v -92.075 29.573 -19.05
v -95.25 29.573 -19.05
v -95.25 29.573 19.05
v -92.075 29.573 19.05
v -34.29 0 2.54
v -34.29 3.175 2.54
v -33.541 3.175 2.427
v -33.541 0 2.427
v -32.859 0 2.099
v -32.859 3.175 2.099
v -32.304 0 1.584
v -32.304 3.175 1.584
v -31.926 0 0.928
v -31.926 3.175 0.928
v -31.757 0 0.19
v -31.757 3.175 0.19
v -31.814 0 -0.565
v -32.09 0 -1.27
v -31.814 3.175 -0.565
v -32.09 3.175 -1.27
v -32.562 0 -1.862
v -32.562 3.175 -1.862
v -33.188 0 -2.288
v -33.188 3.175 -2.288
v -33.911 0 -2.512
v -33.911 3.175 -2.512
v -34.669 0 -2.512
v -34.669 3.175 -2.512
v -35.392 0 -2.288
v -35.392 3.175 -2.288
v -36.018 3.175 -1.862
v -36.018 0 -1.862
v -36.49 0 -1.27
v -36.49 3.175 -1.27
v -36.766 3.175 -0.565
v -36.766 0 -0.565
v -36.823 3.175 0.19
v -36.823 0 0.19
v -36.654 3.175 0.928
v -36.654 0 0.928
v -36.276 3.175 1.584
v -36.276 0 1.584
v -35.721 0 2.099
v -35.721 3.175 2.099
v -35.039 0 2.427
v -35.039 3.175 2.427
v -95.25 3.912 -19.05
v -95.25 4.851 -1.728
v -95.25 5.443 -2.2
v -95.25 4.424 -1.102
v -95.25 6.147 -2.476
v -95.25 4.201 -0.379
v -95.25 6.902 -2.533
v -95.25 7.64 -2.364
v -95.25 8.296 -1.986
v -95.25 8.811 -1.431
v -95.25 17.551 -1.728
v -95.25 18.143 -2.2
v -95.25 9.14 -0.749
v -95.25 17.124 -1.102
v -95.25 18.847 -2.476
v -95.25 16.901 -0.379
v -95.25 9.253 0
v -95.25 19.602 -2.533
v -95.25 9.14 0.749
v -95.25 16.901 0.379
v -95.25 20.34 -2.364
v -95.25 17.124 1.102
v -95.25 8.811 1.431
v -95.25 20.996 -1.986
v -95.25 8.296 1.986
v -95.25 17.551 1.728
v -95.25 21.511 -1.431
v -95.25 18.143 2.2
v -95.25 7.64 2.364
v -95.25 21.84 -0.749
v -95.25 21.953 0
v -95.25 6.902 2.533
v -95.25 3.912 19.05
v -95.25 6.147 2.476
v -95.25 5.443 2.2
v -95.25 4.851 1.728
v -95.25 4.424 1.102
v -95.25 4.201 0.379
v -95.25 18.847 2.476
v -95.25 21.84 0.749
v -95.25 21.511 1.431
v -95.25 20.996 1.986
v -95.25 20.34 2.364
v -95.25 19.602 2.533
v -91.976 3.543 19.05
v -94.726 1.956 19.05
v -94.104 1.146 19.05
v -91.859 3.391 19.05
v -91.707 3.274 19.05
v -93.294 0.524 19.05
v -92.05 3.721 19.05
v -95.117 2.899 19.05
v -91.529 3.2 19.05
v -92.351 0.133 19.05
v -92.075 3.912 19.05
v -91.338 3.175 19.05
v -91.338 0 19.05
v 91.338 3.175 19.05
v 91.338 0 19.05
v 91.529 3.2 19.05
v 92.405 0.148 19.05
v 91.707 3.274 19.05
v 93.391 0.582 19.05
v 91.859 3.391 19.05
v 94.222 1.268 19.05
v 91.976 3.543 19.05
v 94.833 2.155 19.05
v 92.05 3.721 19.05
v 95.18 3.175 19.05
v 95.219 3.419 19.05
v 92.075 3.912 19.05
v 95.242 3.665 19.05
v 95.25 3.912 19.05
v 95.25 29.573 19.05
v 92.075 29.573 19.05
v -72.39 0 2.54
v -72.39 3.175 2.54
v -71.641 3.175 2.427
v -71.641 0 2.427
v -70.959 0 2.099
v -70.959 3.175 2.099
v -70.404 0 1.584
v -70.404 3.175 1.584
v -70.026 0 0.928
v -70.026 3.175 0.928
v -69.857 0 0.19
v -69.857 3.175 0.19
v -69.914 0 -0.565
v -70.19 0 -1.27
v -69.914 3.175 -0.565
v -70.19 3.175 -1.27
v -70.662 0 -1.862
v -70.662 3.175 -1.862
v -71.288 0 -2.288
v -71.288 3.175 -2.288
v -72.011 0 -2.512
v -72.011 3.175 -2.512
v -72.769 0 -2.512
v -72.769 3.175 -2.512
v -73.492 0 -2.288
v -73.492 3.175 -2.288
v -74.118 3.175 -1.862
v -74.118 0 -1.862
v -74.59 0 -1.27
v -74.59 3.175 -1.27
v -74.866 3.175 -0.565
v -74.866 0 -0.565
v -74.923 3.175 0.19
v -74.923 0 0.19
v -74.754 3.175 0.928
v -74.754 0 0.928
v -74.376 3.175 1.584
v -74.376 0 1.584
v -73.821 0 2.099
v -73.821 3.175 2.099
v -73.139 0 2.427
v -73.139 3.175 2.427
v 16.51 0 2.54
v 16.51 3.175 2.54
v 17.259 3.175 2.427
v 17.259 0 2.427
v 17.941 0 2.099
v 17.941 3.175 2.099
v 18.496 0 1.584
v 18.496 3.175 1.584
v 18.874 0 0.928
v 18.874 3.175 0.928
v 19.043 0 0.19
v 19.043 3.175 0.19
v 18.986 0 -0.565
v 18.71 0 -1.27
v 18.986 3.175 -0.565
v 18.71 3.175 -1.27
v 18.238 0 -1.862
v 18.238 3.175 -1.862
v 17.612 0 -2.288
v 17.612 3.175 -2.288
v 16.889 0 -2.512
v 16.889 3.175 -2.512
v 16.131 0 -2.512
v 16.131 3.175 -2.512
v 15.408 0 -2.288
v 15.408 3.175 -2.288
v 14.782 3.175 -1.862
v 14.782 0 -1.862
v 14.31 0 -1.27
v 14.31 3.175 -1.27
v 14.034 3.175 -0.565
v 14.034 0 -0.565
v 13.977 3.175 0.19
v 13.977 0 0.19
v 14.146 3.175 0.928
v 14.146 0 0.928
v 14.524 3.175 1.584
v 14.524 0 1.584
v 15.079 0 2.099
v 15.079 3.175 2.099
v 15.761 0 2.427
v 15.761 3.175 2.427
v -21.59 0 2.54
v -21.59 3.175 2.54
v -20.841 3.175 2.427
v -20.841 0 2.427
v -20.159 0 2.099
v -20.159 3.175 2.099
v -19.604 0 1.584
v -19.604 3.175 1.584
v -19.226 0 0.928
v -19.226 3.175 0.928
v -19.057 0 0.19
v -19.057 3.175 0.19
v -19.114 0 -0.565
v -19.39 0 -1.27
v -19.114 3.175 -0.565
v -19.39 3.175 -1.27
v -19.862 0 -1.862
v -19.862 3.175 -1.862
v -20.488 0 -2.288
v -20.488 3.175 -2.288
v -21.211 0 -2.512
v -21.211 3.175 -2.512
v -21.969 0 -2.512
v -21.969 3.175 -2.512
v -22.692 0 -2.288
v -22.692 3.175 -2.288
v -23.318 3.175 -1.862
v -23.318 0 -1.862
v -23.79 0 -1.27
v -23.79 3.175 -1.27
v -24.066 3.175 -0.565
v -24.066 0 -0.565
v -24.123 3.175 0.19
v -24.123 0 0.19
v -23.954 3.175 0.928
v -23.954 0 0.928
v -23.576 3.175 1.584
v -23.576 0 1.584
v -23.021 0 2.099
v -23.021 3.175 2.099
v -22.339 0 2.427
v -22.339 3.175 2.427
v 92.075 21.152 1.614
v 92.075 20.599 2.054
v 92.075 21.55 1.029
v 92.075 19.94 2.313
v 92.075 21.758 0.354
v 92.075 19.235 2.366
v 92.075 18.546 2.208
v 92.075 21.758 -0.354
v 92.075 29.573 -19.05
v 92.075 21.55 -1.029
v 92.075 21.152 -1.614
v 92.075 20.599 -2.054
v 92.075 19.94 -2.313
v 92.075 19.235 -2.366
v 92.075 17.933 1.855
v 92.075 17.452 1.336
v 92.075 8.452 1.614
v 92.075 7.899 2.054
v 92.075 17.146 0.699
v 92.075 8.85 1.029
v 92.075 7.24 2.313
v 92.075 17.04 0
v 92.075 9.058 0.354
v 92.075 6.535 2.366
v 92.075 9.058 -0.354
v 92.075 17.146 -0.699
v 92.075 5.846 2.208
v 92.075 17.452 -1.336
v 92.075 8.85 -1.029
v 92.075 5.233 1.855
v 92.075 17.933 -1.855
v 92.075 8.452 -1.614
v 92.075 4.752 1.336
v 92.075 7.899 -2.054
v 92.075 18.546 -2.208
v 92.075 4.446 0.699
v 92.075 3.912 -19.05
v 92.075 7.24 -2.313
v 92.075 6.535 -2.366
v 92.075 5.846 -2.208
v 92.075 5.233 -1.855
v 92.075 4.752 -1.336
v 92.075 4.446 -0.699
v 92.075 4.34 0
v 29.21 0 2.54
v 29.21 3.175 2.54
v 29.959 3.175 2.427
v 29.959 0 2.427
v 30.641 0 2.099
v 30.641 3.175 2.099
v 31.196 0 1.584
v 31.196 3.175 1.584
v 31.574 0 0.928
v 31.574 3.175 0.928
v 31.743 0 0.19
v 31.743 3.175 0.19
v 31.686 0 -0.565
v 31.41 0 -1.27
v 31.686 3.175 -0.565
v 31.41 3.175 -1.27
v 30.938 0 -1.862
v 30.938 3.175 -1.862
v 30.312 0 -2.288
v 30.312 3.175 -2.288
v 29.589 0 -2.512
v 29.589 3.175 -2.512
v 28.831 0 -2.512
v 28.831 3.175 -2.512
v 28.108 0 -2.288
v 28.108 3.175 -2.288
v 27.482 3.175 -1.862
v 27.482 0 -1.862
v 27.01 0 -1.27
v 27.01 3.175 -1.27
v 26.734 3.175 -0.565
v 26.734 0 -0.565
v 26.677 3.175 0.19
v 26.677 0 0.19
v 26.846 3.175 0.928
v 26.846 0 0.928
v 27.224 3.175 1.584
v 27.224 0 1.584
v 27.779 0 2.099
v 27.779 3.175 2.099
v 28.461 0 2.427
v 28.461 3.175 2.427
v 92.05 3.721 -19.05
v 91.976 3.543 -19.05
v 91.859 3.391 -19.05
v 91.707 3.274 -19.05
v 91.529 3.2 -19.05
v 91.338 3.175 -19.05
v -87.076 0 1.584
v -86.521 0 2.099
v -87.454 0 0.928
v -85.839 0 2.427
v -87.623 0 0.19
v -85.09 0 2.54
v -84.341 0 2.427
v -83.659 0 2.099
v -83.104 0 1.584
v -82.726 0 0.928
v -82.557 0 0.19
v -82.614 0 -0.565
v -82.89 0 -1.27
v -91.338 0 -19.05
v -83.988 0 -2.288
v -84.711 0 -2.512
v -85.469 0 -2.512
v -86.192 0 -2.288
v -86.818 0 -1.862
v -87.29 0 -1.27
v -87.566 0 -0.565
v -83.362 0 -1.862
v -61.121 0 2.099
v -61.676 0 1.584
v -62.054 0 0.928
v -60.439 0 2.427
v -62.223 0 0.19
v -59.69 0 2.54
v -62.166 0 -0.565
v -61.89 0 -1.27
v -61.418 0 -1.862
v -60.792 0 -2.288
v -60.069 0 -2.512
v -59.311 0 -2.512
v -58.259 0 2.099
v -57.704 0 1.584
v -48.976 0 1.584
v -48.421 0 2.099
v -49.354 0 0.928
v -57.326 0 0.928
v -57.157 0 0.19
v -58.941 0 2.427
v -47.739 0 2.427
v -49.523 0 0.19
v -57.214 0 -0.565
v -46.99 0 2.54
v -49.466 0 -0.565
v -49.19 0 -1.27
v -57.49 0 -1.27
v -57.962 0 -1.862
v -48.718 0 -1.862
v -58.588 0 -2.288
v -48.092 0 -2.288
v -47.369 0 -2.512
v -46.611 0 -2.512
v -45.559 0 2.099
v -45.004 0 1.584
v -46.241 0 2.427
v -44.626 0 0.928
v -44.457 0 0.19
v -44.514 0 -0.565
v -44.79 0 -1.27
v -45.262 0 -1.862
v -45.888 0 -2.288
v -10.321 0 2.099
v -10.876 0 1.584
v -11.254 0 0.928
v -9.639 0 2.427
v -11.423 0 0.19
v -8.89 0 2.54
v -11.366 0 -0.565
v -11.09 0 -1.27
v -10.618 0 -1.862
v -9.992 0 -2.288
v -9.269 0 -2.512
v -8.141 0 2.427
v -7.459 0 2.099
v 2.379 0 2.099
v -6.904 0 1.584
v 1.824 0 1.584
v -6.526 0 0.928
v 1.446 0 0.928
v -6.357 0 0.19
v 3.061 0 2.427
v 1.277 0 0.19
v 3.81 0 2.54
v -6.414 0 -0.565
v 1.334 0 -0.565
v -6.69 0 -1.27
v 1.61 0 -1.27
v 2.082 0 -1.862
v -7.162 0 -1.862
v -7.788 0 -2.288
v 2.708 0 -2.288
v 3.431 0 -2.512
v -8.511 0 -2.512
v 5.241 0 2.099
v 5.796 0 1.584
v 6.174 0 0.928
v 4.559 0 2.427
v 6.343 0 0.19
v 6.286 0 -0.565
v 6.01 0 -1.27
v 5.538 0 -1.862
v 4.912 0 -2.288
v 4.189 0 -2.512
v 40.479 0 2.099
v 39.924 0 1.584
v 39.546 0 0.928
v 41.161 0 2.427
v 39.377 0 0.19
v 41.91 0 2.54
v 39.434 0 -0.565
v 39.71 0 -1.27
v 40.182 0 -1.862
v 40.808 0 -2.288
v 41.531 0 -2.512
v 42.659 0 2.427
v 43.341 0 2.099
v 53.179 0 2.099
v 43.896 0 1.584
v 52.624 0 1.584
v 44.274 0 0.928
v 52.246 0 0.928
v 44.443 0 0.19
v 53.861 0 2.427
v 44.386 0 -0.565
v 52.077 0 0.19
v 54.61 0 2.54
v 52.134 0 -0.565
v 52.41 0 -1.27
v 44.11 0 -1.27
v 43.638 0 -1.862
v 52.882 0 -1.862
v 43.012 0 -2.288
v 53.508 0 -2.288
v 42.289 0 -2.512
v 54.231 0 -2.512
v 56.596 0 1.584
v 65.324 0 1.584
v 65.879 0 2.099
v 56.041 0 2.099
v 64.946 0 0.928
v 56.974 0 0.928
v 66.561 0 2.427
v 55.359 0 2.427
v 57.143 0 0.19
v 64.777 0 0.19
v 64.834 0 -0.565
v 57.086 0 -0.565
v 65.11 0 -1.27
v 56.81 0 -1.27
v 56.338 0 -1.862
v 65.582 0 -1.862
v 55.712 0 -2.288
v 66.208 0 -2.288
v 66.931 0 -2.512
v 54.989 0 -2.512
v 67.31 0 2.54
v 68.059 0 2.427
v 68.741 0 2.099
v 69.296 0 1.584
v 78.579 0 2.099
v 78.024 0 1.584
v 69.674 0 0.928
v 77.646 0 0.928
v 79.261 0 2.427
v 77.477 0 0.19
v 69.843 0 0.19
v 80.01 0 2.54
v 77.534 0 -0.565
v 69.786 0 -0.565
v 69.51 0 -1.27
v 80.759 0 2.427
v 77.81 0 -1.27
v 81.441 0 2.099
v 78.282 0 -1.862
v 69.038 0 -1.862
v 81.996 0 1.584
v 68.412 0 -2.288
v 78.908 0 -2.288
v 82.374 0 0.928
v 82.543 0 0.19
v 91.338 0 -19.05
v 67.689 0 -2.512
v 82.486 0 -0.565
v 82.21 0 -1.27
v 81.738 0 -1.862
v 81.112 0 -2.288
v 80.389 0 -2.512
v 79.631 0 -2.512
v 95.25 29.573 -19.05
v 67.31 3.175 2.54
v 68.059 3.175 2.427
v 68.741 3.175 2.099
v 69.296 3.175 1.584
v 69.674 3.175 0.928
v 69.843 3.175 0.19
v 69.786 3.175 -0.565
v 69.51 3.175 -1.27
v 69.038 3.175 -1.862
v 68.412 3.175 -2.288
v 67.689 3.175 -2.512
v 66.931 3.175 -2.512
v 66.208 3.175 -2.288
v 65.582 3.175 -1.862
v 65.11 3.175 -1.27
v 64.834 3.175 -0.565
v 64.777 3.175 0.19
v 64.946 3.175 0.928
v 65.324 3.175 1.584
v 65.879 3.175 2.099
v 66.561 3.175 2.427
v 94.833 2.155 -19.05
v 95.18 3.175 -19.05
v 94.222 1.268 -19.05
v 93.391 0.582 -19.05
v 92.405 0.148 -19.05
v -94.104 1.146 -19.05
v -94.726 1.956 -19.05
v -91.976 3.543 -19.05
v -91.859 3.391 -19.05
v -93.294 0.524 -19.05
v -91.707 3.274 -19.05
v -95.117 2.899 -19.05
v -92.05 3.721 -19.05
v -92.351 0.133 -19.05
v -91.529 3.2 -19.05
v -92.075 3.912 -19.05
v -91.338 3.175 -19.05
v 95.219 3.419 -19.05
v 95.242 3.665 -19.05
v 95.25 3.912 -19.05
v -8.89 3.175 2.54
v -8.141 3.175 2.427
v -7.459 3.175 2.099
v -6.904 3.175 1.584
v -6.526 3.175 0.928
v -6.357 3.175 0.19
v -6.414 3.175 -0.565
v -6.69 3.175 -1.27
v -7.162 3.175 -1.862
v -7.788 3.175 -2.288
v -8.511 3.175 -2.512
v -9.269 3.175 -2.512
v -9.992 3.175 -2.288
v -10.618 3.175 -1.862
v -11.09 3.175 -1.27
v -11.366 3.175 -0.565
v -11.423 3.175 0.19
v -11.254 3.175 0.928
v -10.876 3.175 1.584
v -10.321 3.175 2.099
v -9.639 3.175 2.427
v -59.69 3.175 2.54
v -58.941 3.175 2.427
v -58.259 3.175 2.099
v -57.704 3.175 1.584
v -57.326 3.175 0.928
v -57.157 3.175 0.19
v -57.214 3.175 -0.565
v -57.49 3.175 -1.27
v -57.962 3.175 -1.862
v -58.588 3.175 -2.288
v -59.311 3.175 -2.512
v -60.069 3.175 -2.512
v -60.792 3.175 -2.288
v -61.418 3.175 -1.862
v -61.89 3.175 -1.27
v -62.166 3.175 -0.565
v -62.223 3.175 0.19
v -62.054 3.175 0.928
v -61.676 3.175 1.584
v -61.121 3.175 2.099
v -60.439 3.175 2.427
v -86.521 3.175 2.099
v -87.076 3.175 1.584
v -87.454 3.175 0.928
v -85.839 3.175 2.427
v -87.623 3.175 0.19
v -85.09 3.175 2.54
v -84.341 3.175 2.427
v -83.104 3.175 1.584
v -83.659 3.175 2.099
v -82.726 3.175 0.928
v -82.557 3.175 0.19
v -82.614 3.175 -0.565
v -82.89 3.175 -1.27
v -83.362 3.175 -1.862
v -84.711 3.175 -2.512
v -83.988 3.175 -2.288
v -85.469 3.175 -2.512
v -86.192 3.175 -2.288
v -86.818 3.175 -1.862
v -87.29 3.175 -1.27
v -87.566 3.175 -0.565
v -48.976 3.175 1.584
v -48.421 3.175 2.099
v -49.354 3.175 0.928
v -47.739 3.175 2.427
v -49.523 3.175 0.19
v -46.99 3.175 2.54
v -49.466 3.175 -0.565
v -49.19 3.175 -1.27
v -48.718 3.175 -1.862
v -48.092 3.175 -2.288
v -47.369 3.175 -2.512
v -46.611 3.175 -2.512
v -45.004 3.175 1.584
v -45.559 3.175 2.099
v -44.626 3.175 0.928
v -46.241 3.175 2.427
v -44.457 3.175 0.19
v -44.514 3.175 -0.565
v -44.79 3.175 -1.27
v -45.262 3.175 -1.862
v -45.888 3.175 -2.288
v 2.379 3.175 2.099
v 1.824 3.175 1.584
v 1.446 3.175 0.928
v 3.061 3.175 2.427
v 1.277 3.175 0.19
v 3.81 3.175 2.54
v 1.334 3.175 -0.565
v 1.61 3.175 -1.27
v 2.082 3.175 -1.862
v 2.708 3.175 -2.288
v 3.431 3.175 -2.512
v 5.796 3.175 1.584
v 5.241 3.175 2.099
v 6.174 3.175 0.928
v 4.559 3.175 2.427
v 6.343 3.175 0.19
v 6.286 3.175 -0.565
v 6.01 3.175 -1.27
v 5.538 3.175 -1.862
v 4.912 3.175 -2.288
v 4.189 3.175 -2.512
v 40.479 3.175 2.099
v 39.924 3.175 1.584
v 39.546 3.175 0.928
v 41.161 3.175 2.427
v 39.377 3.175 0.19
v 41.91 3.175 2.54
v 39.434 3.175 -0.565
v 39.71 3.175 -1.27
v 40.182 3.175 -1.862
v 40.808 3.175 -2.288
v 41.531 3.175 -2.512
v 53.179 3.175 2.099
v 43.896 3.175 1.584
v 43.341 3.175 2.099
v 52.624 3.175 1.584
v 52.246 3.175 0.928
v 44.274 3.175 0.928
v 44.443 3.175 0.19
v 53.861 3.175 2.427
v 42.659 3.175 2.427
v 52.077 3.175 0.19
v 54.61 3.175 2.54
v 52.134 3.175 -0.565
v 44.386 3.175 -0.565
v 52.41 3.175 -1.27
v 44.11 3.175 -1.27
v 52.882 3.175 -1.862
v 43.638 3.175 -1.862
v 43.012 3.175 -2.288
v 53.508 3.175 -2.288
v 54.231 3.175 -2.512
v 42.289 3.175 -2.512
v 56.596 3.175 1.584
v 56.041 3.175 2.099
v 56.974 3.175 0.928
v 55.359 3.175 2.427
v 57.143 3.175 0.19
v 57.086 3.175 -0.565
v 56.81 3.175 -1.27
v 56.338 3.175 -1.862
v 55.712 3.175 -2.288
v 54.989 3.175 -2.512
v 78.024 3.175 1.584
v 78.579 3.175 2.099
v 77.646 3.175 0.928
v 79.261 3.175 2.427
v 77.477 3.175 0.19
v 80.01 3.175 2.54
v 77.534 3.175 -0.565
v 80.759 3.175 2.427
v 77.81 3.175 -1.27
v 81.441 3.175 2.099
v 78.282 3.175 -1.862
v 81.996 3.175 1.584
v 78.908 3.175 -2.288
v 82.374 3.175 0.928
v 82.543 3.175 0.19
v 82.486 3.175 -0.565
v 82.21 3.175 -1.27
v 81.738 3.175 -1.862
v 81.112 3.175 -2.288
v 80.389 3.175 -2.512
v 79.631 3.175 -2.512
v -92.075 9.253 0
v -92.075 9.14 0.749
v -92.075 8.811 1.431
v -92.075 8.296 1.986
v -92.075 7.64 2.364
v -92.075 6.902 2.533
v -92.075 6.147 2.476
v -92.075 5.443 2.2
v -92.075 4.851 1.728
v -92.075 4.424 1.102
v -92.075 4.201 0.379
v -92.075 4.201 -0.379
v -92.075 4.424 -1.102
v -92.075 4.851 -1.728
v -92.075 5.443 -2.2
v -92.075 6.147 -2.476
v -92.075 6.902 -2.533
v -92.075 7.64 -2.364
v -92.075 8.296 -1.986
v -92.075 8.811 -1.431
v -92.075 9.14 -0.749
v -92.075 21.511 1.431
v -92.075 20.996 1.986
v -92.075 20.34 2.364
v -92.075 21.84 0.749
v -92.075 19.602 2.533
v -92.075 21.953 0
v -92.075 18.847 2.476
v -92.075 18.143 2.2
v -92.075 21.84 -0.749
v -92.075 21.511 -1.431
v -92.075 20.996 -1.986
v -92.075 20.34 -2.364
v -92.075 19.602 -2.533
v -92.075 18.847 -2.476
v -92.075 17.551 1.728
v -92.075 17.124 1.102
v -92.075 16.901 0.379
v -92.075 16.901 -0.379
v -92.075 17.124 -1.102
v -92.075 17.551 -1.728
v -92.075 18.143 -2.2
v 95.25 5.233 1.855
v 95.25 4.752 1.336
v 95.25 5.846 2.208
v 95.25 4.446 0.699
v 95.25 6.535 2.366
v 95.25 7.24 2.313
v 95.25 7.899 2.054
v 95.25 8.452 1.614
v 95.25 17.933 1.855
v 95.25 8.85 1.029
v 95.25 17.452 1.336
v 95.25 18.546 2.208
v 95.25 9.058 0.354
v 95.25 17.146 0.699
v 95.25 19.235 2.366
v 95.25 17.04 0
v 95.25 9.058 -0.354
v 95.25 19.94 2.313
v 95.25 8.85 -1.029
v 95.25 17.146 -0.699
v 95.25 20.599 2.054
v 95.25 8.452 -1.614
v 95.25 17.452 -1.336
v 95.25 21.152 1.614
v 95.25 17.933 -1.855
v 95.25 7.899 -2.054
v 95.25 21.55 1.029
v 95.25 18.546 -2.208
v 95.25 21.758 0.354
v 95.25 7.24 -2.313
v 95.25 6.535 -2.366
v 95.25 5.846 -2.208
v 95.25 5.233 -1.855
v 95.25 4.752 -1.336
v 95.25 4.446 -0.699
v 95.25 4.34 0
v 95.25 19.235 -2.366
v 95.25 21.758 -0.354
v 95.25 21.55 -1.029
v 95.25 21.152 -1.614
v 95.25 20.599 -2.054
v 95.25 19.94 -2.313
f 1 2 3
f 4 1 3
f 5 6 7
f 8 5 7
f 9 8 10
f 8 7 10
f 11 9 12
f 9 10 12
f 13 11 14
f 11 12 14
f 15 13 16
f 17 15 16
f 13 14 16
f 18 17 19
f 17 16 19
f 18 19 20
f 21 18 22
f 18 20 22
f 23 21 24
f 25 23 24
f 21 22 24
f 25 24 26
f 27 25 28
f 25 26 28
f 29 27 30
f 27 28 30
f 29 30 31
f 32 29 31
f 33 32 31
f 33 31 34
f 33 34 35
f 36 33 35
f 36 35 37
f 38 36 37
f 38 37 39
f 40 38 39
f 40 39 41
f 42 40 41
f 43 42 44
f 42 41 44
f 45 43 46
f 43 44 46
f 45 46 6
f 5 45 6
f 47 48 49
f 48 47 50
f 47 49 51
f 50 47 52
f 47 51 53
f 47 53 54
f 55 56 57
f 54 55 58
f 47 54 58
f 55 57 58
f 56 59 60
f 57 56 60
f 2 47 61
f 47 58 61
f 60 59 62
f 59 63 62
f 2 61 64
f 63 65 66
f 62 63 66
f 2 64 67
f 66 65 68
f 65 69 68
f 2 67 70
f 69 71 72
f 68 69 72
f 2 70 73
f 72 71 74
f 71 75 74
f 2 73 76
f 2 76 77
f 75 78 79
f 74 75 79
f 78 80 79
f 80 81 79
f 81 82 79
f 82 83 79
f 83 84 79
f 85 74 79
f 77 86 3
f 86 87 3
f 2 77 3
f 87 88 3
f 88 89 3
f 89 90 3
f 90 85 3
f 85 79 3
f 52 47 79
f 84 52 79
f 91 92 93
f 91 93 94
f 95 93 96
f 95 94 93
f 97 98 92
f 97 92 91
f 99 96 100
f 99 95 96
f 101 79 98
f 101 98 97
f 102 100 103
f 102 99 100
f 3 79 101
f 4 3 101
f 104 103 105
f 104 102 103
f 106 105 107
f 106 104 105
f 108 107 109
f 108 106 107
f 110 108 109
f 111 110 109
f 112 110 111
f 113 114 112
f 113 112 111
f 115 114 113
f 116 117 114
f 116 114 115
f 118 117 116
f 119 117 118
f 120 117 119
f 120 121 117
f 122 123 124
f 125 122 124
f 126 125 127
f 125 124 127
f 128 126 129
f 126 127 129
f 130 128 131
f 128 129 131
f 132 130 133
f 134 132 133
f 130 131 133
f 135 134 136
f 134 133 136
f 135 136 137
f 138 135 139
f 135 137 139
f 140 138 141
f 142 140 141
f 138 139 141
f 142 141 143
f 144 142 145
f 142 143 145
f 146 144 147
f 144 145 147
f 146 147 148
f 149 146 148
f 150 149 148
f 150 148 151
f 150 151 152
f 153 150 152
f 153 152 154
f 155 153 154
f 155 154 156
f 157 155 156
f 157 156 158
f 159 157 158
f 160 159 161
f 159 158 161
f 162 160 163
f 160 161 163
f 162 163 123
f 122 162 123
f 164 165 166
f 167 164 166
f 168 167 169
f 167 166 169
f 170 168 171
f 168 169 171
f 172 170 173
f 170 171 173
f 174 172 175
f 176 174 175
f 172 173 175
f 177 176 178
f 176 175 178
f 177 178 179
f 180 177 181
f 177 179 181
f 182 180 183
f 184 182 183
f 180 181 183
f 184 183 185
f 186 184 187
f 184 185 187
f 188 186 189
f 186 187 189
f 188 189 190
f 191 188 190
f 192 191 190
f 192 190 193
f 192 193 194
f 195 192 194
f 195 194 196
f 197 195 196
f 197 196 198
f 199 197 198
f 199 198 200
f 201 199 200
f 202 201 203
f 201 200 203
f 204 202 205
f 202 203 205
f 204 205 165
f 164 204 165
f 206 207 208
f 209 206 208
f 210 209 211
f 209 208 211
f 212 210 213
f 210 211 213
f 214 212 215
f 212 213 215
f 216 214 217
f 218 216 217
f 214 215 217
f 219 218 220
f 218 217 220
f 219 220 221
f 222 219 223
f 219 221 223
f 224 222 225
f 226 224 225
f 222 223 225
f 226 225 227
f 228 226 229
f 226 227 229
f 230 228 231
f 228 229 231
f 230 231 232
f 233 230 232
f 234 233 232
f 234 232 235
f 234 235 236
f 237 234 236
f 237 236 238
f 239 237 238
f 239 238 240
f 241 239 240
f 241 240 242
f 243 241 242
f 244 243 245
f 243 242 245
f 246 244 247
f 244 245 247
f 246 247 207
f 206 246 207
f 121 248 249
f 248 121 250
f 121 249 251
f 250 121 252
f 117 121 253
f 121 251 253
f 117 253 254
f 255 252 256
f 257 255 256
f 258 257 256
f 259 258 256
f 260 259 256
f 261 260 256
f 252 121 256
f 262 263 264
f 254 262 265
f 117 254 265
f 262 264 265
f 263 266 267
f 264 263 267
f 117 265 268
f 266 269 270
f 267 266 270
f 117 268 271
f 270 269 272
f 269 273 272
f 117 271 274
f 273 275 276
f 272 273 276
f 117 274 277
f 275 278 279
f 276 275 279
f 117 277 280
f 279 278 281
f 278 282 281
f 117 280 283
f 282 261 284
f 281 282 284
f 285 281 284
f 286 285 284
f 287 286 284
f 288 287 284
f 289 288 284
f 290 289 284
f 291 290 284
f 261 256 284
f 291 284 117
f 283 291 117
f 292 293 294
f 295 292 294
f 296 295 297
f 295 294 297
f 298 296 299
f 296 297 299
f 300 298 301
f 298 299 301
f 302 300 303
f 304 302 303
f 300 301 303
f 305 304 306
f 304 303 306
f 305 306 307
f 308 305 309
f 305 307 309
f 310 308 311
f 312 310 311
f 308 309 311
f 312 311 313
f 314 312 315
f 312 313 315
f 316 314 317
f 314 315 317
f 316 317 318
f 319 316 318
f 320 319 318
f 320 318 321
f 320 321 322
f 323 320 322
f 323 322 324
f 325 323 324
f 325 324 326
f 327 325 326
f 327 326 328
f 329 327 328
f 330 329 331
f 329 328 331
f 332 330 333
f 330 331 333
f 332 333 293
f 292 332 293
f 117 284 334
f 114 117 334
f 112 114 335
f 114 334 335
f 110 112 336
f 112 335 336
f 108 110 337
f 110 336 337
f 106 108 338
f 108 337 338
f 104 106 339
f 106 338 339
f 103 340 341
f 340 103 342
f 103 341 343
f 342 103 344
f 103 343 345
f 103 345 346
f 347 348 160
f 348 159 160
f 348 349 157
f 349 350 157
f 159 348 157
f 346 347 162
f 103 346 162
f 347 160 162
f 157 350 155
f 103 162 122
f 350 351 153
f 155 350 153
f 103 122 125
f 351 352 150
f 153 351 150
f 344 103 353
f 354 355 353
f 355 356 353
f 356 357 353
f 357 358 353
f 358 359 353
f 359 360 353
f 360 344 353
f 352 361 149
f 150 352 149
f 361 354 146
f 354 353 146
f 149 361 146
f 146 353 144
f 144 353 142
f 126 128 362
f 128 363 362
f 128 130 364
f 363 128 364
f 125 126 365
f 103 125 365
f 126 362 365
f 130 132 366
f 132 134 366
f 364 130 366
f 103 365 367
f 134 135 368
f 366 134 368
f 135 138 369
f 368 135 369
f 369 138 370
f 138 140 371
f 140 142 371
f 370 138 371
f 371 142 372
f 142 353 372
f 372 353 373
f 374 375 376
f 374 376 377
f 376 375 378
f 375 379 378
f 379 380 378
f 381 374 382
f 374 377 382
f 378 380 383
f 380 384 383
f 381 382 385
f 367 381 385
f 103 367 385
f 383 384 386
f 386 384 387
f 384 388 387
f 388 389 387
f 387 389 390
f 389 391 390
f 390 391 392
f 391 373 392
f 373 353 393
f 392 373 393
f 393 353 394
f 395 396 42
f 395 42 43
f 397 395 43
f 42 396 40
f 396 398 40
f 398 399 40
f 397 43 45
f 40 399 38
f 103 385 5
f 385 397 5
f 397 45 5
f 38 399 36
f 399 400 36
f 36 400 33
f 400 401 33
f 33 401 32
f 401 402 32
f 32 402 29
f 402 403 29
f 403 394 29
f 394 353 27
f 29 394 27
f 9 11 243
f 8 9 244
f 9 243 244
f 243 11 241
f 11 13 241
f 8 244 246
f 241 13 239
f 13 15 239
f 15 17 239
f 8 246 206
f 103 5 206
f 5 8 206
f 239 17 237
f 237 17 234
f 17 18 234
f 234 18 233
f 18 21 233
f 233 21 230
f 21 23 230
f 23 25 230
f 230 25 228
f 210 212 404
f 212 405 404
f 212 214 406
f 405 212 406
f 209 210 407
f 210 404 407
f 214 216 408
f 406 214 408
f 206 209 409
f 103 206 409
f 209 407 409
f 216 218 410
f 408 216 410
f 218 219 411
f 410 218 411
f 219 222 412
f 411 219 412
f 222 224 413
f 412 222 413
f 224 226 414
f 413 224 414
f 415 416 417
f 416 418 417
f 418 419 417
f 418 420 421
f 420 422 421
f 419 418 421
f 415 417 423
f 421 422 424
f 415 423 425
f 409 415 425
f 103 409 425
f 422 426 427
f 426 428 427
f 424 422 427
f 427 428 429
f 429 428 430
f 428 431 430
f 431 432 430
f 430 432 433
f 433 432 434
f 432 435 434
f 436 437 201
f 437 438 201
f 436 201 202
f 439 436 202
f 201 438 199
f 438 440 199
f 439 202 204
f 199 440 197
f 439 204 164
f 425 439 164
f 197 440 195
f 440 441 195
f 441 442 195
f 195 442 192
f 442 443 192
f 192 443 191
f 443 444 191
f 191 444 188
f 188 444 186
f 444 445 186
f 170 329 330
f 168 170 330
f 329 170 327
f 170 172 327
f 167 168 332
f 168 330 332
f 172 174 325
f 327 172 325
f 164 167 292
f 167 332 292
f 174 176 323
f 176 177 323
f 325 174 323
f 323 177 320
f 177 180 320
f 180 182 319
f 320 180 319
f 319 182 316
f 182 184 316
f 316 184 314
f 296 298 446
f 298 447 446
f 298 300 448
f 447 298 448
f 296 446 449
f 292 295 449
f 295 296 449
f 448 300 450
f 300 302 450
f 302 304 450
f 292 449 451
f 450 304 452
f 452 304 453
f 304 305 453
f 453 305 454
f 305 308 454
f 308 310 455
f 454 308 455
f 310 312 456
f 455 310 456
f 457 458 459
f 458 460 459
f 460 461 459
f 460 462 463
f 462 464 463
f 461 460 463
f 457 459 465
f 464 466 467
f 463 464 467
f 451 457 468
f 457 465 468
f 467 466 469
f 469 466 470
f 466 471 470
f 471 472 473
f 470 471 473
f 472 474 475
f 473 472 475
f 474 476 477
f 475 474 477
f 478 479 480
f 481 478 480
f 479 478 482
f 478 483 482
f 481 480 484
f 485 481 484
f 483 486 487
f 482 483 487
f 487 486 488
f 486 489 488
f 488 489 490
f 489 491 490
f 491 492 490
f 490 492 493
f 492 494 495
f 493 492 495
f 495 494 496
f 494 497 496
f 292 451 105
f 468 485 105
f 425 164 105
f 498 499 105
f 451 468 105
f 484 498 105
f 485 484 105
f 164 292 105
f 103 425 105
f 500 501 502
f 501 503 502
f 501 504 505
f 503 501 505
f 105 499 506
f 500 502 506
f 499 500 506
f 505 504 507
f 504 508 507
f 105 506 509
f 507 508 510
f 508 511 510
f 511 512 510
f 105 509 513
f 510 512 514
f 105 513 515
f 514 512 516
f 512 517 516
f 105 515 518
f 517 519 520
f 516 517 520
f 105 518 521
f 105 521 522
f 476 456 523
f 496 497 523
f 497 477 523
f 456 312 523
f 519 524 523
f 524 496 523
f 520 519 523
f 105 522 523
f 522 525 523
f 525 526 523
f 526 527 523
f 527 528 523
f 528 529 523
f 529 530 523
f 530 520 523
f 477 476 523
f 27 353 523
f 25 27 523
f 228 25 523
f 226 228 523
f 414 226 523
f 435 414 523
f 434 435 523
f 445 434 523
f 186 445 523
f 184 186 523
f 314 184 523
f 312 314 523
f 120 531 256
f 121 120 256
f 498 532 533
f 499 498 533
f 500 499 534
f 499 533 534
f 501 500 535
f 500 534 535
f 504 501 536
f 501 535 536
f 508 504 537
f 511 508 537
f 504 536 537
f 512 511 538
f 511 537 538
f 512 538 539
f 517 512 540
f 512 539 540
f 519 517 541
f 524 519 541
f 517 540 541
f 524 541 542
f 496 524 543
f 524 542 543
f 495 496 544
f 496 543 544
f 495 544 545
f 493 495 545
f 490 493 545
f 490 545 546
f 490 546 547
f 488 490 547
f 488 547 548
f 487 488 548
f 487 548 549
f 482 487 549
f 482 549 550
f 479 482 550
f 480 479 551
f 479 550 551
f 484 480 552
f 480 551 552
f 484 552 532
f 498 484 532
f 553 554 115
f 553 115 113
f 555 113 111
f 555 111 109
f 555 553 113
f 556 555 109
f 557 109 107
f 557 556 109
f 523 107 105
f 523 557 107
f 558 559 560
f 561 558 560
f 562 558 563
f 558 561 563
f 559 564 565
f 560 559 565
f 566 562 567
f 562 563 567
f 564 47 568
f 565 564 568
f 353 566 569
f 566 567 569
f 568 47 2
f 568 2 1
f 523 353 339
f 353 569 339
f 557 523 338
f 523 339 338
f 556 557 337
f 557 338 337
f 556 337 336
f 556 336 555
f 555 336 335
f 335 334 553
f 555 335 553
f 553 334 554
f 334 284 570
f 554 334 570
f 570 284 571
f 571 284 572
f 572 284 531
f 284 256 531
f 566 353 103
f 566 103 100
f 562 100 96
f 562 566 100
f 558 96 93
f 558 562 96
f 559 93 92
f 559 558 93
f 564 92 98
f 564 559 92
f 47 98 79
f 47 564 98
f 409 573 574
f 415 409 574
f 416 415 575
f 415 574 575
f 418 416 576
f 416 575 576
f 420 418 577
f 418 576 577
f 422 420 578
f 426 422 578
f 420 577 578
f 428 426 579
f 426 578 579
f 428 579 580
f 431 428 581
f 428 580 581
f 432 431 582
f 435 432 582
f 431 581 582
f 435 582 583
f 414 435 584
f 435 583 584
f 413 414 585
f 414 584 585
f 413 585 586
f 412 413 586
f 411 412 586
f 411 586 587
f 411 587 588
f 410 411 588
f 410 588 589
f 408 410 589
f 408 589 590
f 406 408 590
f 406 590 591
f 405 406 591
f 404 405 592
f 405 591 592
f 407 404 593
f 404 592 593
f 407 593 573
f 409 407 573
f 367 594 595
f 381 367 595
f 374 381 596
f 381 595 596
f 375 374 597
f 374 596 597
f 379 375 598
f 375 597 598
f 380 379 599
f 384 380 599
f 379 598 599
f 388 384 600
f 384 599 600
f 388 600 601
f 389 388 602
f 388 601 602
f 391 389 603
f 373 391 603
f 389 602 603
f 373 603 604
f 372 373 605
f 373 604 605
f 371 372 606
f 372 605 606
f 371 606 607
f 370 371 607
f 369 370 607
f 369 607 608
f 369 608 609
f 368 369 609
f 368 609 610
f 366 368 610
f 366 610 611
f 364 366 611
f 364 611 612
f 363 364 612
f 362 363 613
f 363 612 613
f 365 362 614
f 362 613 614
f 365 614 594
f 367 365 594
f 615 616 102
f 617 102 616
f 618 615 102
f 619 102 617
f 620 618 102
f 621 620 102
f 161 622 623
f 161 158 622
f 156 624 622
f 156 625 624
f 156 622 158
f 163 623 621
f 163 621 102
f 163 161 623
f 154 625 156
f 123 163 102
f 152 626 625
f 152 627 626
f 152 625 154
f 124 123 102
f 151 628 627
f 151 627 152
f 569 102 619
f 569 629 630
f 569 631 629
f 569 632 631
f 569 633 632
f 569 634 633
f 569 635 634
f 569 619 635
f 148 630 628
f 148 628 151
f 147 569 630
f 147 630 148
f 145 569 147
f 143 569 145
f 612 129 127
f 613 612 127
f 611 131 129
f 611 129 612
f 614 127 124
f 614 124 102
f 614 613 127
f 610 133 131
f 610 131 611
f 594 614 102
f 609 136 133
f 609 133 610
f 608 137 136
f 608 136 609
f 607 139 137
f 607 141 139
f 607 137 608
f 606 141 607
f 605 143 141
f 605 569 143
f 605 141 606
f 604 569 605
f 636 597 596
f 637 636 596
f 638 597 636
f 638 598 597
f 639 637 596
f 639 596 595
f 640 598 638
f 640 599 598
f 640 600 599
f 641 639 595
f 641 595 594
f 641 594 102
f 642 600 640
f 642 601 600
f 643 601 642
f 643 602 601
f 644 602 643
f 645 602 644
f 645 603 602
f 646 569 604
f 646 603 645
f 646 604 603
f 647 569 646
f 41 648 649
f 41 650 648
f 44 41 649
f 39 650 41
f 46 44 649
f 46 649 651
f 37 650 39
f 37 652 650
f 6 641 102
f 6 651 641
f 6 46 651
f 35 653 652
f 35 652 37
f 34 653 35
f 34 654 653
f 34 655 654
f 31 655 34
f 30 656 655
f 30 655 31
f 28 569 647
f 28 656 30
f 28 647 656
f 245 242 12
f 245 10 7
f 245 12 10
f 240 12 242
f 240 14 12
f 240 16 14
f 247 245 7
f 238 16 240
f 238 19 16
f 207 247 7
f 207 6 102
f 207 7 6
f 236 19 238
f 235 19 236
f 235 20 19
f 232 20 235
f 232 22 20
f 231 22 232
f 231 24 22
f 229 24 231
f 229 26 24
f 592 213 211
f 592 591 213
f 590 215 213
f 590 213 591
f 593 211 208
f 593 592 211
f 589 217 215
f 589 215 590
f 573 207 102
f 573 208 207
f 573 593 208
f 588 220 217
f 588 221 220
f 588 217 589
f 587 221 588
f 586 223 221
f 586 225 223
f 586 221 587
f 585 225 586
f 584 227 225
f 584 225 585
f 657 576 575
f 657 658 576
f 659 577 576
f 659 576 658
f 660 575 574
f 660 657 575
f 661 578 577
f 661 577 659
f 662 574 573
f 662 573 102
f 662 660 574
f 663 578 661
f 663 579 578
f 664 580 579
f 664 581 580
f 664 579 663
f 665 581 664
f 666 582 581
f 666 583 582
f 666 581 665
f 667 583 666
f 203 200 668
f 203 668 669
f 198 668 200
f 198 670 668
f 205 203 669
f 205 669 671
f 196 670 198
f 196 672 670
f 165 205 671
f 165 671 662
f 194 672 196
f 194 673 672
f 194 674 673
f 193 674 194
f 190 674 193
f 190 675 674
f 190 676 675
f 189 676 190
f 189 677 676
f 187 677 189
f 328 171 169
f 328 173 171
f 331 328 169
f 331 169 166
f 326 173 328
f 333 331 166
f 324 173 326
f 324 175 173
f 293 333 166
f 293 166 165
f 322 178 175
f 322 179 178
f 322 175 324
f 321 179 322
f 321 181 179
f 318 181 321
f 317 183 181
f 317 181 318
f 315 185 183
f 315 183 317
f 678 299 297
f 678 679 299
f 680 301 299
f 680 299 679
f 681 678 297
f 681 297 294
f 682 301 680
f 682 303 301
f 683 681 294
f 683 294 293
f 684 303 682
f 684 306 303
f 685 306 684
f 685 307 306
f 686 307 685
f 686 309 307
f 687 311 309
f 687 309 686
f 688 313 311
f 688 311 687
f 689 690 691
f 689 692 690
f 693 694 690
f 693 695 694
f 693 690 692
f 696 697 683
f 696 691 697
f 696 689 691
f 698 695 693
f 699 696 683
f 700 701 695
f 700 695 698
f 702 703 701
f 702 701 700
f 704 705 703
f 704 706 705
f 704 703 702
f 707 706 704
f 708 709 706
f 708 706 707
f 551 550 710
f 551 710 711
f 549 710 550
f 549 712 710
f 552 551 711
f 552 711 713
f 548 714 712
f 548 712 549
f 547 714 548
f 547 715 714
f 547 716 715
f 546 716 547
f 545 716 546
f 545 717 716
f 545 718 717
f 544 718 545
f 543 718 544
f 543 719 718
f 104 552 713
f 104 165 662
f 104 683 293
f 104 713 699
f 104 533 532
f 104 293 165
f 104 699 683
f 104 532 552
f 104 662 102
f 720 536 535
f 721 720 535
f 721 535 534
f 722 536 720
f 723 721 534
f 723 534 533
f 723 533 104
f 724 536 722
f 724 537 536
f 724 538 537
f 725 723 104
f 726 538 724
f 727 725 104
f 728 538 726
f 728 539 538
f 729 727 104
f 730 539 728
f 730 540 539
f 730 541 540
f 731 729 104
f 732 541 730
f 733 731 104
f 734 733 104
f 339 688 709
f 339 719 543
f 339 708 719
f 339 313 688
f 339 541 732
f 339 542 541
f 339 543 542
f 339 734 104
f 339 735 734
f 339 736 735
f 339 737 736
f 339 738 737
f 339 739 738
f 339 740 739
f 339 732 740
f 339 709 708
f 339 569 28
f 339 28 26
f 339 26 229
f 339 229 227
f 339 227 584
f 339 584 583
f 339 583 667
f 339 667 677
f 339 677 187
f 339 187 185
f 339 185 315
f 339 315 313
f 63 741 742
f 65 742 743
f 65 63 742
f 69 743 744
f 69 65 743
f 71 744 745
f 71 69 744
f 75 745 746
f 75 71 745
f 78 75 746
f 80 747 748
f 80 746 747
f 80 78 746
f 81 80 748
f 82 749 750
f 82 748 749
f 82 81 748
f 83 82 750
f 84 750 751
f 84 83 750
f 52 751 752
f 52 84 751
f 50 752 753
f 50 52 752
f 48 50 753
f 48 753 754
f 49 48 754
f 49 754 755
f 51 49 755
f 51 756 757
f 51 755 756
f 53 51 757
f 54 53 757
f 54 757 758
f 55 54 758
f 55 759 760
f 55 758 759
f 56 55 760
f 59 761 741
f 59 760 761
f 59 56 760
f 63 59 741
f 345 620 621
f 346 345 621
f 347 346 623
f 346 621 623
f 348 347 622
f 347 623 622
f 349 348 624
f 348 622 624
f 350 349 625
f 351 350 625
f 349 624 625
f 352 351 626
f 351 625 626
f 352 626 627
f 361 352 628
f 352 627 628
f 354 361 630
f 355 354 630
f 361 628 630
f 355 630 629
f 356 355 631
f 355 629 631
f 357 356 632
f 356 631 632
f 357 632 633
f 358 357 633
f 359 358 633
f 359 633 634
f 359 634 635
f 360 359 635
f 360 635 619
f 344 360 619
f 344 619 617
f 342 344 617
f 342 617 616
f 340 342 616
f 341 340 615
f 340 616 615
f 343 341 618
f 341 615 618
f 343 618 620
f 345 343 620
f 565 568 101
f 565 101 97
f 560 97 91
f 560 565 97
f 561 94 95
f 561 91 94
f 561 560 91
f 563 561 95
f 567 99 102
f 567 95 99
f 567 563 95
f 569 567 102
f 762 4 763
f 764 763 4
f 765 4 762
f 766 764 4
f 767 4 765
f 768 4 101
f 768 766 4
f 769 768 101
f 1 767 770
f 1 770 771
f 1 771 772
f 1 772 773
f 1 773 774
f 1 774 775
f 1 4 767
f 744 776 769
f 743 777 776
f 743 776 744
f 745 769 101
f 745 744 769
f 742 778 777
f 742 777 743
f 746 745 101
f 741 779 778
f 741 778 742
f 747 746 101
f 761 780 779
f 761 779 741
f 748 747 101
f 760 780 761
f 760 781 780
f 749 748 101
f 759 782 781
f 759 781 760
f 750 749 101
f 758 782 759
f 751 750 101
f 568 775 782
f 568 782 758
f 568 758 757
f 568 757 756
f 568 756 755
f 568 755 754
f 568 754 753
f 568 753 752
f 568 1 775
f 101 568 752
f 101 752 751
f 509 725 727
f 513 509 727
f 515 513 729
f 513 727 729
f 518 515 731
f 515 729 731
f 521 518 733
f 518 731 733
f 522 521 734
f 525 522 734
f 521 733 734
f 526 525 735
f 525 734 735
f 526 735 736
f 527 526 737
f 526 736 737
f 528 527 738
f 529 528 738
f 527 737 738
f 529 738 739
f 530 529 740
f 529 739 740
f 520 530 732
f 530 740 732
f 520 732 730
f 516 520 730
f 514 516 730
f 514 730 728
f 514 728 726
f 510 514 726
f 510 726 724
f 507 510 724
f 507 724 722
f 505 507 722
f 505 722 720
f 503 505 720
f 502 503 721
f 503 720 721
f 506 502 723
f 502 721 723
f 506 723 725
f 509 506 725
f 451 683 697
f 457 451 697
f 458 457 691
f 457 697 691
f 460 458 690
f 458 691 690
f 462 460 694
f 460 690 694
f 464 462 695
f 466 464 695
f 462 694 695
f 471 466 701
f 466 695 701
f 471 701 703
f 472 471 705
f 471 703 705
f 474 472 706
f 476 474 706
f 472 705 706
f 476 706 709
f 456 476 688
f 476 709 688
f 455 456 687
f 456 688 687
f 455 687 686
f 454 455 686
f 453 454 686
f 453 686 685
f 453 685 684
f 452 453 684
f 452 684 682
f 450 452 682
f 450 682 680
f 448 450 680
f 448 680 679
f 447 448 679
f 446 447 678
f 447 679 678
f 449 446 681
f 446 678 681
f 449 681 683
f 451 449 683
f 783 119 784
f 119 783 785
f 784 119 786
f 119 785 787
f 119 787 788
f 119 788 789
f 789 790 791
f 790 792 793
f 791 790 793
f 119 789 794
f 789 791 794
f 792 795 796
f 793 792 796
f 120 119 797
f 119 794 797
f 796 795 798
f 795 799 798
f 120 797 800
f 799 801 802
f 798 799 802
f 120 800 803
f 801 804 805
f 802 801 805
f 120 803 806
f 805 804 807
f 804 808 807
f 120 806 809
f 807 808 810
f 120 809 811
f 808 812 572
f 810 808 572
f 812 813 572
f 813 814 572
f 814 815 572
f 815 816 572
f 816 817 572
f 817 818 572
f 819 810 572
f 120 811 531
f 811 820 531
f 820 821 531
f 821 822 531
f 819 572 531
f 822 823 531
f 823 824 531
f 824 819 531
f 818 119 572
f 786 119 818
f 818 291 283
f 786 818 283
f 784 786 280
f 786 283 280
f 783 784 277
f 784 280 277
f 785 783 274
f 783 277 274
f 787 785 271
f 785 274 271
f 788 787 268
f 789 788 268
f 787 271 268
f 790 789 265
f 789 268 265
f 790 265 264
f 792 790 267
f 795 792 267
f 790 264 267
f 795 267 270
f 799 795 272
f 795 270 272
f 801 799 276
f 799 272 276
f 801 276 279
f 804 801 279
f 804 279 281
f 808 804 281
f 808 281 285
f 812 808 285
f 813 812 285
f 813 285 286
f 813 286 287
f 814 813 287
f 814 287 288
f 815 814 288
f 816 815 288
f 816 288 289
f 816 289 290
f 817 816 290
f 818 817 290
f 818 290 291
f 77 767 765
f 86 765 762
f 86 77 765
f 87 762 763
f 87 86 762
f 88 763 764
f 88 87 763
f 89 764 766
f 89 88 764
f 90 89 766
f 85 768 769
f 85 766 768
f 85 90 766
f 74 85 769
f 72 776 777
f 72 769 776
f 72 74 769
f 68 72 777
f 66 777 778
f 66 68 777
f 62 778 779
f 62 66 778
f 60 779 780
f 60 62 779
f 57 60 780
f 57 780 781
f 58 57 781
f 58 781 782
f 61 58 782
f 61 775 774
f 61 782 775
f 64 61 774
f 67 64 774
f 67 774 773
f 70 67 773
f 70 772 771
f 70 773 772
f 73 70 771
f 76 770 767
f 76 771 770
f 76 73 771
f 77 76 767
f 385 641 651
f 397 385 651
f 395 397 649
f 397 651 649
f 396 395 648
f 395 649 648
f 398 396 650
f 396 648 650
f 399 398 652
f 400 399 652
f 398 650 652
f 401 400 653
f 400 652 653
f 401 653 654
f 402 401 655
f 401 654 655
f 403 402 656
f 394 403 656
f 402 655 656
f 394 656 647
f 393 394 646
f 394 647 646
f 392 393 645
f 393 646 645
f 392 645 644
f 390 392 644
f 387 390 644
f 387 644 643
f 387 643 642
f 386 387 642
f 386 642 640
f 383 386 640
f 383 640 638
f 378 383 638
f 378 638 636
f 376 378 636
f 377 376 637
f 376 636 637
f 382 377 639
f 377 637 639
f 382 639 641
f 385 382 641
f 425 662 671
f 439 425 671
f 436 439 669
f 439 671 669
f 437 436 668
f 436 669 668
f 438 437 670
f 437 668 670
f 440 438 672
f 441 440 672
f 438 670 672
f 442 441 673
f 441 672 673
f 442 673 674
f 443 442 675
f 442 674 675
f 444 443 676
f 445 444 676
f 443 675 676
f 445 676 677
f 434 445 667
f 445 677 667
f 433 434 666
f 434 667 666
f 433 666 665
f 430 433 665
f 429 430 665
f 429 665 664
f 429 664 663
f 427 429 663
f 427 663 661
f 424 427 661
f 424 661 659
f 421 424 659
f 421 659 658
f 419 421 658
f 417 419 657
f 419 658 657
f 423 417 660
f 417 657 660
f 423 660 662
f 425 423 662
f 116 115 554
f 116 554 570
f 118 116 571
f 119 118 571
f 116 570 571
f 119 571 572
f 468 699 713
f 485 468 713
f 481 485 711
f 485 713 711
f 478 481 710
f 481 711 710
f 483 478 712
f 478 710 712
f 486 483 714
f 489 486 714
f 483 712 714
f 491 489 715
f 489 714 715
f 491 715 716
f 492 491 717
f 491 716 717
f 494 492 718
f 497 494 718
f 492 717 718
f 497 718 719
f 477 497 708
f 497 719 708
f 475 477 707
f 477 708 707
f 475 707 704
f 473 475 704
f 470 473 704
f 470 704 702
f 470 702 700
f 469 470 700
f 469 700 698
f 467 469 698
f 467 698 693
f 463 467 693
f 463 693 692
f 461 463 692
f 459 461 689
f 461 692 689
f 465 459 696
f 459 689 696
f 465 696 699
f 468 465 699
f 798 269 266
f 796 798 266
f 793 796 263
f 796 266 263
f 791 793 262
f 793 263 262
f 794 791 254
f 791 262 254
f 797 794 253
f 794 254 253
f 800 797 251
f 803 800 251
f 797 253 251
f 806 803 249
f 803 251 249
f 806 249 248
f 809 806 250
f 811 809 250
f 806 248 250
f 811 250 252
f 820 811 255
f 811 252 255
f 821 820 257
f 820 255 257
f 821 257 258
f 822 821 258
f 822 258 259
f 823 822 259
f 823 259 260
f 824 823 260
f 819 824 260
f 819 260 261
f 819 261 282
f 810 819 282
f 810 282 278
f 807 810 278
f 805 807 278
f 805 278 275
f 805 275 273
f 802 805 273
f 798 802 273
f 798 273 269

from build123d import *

# Parameters (mm, degrees)
SKETCH1_W                  = 241.3
SKETCH1_H                  = 38.1
BOSS_EXTRUDE1_DEPTH        = 3.175
SKETCH2_R                  = 2.54
CUT_EXTRUDE1_DEPTH         = 3.175
LPATTERN1_COUNT            = 16
LPATTERN1_PITCH            = 12.7
SKETCHED_START             = -120.65
SKETCHED_BEND2_OUTLINE_W   = 3.175
SKETCHED_BEND2_OUTLINE_H   = 38.1
SKETCHED_BEND2_DEPTH       = 25.4
SKETCHED_START_2           = -94.869557784
SKETCHED_BEND2_2_OUTLINE_W = 26.397512257
SKETCHED_BEND2_2_OUTLINE_H = 38.1
SKETCHED_BEND2_2_OUTLINE_R = 2.54
SKETCHED_BEND2_2_DEPTH     = 2.794557784
SKETCHED_START_3           = -95.25
SKETCHED_BEND2_3_OUTLINE_W = 26.397512257
SKETCHED_BEND2_3_OUTLINE_H = 38.1
SKETCHED_BEND2_3_OUTLINE_R = 2.54
SKETCHED_BEND2_3_DEPTH     = 3.9116
SKETCHED_START_4           = -20
SKETCHED_BEND2_4_DEPTH     = 40
SKETCHED_START_5           = -19.05
SKETCHED_BEND3_DEPTH       = 38.1
SKETCHED_BEND3_2_DEPTH     = 38.1
SKETCH28_R                 = 2.372260046
CUT_EXTRUDE2_DEPTH         = 10.922
LPATTERN2_COUNT            = 2
LPATTERN2_PITCH            = 12.7


with BuildPart() as part:
    # Sketch1 → Boss-Extrude1 (new body)
    with BuildSketch(Plane(origin=(0, 0, 0), x_dir=(1, 0, 0), z_dir=(0, 1, 0))):
        Rectangle(SKETCH1_W, SKETCH1_H)
    extrude(amount=BOSS_EXTRUDE1_DEPTH)

    # Sketch2 → Cut-Extrude1 (cut)
    with BuildSketch(Plane(origin=(0, 3.175, 0), x_dir=(1, 0, 0), z_dir=(0, 1, 0))):
        with Locations(Location((-110.49, 0, 0), (0, 0, 270))):
            Circle(SKETCH2_R)
    cut_extrude1 = extrude(amount=-CUT_EXTRUDE1_DEPTH, mode=Mode.SUBTRACT)

    # LPattern1: Cut-Extrude1 ×16
    with Locations(*[(i * LPATTERN1_PITCH, 0, 0) for i in range(1, LPATTERN1_COUNT)]):
        add(cut_extrude1, mode=Mode.SUBTRACT)

    # Sketched Bend2: read off the stored shape, not the designer's step
    # Sketched Bend2 outline → Sketched Bend2 (cut)
    with BuildSketch(Plane.YZ.offset(SKETCHED_START)):
        with Locations((1.5875, 0)):
            Rectangle(SKETCHED_BEND2_OUTLINE_W, SKETCHED_BEND2_OUTLINE_H)
    extrude(amount=SKETCHED_BEND2_DEPTH, mode=Mode.SUBTRACT)

    # Sketched Bend2 2 outline → Sketched Bend2 2 (add)
    with BuildSketch(Plane.YZ.offset(SKETCHED_START_2)):
        with Locations((16.373756129, 0)):
            Rectangle(SKETCHED_BEND2_2_OUTLINE_W, SKETCHED_BEND2_2_OUTLINE_H)
        with Locations((6.712512257, 0)):
            Circle(SKETCHED_BEND2_2_OUTLINE_R, mode=Mode.SUBTRACT)
        with Locations((19.412512257, 0)):
            Circle(SKETCHED_BEND2_2_OUTLINE_R, mode=Mode.SUBTRACT)
    extrude(amount=SKETCHED_BEND2_2_DEPTH)

    # Sketched Bend2 3 outline → Sketched Bend2 3 (add)
    with BuildSketch(Plane.YZ.offset(SKETCHED_START_3)):
        with Locations((16.373756129, 0)):
            Rectangle(SKETCHED_BEND2_3_OUTLINE_W, SKETCHED_BEND2_3_OUTLINE_H)
        with Locations((6.712512257, 0)):
            Circle(SKETCHED_BEND2_3_OUTLINE_R, mode=Mode.SUBTRACT)
        with Locations((19.412512257, 0)):
            Circle(SKETCHED_BEND2_3_OUTLINE_R, mode=Mode.SUBTRACT)
    extrude(amount=SKETCHED_BEND2_3_DEPTH)

    # Sketched Bend2 4 outline → Sketched Bend2 4 (cut)
    with BuildSketch(Plane.XY.offset(SKETCHED_START_4)):
        with BuildLine():
            ThreePointArc((-91.3384, 0), (-94.104318885, 1.145681115), (-95.25, 3.9116))
            Line((-95.25, 3.9116), (-95.25, 0))
            Line((-95.25, 0), (-91.3384, 0))
        make_face()
        with BuildLine():
            Line((-92.075, 29.572512257), (-92.075, 3.9116))
            ThreePointArc((-92.075, 3.9116), (-91.859254855, 3.390745145), (-91.3384, 3.175))
            Line((-91.3384, 3.175), (-91.3384, 29.572512257))
            Line((-91.3384, 29.572512257), (-92.075, 29.572512257))
        make_face()
    extrude(amount=SKETCHED_BEND2_4_DEPTH, mode=Mode.SUBTRACT)

    # Sketched Bend3: read off the stored shape, not the designer's step
    # Sketched Bend3 outline → Sketched Bend3 (cut)
    with BuildSketch(Plane.XY.offset(SKETCHED_START_5)):
        with BuildLine():
            Line((120.65, 3.175), (95.180018799, 3.175))
            ThreePointArc((95.180018799, 3.175), (93.830319942, 0.896479843), (91.3384, 0))
            Line((91.3384, 0), (120.65, 0))
            Line((120.65, 0), (120.65, 3.175))
        make_face()
    extrude(amount=SKETCHED_BEND3_DEPTH, mode=Mode.SUBTRACT)

    # Sketched Bend3 2 outline → Sketched Bend3 2 (add)
    with BuildSketch(Plane.XY.offset(SKETCHED_START_5)):
        with BuildLine():
            Line((95.25, 29.572512257), (92.075, 29.572512257))
            Line((92.075, 29.572512257), (92.075, 3.9116))
            ThreePointArc((92.075, 3.9116), (91.859254855, 3.390745145), (91.3384, 3.175))
            Line((91.3384, 3.175), (95.180018799, 3.175))
            ThreePointArc((95.180018799, 3.175), (95.232465398, 3.541641581), (95.25, 3.9116))
            Line((95.25, 3.9116), (95.25, 29.572512257))
        make_face()
    extrude(amount=SKETCHED_BEND3_2_DEPTH)

    # Sketch28 → Cut-Extrude2 (cut)
    with BuildSketch(Plane.ZY.offset(-92.075)):
        with Locations(Location((0, 19.412512257, 0), (0, 0, 270))):
            Circle(SKETCH28_R)
    cut_extrude2 = extrude(amount=-CUT_EXTRUDE2_DEPTH, mode=Mode.SUBTRACT)

    # LPattern2: Cut-Extrude2 ×2
    with Locations(*[(0, -i * LPATTERN2_PITCH, 0) for i in range(1, LPATTERN2_COUNT)]):
        add(cut_extrude2, mode=Mode.SUBTRACT)


solid = part.part
